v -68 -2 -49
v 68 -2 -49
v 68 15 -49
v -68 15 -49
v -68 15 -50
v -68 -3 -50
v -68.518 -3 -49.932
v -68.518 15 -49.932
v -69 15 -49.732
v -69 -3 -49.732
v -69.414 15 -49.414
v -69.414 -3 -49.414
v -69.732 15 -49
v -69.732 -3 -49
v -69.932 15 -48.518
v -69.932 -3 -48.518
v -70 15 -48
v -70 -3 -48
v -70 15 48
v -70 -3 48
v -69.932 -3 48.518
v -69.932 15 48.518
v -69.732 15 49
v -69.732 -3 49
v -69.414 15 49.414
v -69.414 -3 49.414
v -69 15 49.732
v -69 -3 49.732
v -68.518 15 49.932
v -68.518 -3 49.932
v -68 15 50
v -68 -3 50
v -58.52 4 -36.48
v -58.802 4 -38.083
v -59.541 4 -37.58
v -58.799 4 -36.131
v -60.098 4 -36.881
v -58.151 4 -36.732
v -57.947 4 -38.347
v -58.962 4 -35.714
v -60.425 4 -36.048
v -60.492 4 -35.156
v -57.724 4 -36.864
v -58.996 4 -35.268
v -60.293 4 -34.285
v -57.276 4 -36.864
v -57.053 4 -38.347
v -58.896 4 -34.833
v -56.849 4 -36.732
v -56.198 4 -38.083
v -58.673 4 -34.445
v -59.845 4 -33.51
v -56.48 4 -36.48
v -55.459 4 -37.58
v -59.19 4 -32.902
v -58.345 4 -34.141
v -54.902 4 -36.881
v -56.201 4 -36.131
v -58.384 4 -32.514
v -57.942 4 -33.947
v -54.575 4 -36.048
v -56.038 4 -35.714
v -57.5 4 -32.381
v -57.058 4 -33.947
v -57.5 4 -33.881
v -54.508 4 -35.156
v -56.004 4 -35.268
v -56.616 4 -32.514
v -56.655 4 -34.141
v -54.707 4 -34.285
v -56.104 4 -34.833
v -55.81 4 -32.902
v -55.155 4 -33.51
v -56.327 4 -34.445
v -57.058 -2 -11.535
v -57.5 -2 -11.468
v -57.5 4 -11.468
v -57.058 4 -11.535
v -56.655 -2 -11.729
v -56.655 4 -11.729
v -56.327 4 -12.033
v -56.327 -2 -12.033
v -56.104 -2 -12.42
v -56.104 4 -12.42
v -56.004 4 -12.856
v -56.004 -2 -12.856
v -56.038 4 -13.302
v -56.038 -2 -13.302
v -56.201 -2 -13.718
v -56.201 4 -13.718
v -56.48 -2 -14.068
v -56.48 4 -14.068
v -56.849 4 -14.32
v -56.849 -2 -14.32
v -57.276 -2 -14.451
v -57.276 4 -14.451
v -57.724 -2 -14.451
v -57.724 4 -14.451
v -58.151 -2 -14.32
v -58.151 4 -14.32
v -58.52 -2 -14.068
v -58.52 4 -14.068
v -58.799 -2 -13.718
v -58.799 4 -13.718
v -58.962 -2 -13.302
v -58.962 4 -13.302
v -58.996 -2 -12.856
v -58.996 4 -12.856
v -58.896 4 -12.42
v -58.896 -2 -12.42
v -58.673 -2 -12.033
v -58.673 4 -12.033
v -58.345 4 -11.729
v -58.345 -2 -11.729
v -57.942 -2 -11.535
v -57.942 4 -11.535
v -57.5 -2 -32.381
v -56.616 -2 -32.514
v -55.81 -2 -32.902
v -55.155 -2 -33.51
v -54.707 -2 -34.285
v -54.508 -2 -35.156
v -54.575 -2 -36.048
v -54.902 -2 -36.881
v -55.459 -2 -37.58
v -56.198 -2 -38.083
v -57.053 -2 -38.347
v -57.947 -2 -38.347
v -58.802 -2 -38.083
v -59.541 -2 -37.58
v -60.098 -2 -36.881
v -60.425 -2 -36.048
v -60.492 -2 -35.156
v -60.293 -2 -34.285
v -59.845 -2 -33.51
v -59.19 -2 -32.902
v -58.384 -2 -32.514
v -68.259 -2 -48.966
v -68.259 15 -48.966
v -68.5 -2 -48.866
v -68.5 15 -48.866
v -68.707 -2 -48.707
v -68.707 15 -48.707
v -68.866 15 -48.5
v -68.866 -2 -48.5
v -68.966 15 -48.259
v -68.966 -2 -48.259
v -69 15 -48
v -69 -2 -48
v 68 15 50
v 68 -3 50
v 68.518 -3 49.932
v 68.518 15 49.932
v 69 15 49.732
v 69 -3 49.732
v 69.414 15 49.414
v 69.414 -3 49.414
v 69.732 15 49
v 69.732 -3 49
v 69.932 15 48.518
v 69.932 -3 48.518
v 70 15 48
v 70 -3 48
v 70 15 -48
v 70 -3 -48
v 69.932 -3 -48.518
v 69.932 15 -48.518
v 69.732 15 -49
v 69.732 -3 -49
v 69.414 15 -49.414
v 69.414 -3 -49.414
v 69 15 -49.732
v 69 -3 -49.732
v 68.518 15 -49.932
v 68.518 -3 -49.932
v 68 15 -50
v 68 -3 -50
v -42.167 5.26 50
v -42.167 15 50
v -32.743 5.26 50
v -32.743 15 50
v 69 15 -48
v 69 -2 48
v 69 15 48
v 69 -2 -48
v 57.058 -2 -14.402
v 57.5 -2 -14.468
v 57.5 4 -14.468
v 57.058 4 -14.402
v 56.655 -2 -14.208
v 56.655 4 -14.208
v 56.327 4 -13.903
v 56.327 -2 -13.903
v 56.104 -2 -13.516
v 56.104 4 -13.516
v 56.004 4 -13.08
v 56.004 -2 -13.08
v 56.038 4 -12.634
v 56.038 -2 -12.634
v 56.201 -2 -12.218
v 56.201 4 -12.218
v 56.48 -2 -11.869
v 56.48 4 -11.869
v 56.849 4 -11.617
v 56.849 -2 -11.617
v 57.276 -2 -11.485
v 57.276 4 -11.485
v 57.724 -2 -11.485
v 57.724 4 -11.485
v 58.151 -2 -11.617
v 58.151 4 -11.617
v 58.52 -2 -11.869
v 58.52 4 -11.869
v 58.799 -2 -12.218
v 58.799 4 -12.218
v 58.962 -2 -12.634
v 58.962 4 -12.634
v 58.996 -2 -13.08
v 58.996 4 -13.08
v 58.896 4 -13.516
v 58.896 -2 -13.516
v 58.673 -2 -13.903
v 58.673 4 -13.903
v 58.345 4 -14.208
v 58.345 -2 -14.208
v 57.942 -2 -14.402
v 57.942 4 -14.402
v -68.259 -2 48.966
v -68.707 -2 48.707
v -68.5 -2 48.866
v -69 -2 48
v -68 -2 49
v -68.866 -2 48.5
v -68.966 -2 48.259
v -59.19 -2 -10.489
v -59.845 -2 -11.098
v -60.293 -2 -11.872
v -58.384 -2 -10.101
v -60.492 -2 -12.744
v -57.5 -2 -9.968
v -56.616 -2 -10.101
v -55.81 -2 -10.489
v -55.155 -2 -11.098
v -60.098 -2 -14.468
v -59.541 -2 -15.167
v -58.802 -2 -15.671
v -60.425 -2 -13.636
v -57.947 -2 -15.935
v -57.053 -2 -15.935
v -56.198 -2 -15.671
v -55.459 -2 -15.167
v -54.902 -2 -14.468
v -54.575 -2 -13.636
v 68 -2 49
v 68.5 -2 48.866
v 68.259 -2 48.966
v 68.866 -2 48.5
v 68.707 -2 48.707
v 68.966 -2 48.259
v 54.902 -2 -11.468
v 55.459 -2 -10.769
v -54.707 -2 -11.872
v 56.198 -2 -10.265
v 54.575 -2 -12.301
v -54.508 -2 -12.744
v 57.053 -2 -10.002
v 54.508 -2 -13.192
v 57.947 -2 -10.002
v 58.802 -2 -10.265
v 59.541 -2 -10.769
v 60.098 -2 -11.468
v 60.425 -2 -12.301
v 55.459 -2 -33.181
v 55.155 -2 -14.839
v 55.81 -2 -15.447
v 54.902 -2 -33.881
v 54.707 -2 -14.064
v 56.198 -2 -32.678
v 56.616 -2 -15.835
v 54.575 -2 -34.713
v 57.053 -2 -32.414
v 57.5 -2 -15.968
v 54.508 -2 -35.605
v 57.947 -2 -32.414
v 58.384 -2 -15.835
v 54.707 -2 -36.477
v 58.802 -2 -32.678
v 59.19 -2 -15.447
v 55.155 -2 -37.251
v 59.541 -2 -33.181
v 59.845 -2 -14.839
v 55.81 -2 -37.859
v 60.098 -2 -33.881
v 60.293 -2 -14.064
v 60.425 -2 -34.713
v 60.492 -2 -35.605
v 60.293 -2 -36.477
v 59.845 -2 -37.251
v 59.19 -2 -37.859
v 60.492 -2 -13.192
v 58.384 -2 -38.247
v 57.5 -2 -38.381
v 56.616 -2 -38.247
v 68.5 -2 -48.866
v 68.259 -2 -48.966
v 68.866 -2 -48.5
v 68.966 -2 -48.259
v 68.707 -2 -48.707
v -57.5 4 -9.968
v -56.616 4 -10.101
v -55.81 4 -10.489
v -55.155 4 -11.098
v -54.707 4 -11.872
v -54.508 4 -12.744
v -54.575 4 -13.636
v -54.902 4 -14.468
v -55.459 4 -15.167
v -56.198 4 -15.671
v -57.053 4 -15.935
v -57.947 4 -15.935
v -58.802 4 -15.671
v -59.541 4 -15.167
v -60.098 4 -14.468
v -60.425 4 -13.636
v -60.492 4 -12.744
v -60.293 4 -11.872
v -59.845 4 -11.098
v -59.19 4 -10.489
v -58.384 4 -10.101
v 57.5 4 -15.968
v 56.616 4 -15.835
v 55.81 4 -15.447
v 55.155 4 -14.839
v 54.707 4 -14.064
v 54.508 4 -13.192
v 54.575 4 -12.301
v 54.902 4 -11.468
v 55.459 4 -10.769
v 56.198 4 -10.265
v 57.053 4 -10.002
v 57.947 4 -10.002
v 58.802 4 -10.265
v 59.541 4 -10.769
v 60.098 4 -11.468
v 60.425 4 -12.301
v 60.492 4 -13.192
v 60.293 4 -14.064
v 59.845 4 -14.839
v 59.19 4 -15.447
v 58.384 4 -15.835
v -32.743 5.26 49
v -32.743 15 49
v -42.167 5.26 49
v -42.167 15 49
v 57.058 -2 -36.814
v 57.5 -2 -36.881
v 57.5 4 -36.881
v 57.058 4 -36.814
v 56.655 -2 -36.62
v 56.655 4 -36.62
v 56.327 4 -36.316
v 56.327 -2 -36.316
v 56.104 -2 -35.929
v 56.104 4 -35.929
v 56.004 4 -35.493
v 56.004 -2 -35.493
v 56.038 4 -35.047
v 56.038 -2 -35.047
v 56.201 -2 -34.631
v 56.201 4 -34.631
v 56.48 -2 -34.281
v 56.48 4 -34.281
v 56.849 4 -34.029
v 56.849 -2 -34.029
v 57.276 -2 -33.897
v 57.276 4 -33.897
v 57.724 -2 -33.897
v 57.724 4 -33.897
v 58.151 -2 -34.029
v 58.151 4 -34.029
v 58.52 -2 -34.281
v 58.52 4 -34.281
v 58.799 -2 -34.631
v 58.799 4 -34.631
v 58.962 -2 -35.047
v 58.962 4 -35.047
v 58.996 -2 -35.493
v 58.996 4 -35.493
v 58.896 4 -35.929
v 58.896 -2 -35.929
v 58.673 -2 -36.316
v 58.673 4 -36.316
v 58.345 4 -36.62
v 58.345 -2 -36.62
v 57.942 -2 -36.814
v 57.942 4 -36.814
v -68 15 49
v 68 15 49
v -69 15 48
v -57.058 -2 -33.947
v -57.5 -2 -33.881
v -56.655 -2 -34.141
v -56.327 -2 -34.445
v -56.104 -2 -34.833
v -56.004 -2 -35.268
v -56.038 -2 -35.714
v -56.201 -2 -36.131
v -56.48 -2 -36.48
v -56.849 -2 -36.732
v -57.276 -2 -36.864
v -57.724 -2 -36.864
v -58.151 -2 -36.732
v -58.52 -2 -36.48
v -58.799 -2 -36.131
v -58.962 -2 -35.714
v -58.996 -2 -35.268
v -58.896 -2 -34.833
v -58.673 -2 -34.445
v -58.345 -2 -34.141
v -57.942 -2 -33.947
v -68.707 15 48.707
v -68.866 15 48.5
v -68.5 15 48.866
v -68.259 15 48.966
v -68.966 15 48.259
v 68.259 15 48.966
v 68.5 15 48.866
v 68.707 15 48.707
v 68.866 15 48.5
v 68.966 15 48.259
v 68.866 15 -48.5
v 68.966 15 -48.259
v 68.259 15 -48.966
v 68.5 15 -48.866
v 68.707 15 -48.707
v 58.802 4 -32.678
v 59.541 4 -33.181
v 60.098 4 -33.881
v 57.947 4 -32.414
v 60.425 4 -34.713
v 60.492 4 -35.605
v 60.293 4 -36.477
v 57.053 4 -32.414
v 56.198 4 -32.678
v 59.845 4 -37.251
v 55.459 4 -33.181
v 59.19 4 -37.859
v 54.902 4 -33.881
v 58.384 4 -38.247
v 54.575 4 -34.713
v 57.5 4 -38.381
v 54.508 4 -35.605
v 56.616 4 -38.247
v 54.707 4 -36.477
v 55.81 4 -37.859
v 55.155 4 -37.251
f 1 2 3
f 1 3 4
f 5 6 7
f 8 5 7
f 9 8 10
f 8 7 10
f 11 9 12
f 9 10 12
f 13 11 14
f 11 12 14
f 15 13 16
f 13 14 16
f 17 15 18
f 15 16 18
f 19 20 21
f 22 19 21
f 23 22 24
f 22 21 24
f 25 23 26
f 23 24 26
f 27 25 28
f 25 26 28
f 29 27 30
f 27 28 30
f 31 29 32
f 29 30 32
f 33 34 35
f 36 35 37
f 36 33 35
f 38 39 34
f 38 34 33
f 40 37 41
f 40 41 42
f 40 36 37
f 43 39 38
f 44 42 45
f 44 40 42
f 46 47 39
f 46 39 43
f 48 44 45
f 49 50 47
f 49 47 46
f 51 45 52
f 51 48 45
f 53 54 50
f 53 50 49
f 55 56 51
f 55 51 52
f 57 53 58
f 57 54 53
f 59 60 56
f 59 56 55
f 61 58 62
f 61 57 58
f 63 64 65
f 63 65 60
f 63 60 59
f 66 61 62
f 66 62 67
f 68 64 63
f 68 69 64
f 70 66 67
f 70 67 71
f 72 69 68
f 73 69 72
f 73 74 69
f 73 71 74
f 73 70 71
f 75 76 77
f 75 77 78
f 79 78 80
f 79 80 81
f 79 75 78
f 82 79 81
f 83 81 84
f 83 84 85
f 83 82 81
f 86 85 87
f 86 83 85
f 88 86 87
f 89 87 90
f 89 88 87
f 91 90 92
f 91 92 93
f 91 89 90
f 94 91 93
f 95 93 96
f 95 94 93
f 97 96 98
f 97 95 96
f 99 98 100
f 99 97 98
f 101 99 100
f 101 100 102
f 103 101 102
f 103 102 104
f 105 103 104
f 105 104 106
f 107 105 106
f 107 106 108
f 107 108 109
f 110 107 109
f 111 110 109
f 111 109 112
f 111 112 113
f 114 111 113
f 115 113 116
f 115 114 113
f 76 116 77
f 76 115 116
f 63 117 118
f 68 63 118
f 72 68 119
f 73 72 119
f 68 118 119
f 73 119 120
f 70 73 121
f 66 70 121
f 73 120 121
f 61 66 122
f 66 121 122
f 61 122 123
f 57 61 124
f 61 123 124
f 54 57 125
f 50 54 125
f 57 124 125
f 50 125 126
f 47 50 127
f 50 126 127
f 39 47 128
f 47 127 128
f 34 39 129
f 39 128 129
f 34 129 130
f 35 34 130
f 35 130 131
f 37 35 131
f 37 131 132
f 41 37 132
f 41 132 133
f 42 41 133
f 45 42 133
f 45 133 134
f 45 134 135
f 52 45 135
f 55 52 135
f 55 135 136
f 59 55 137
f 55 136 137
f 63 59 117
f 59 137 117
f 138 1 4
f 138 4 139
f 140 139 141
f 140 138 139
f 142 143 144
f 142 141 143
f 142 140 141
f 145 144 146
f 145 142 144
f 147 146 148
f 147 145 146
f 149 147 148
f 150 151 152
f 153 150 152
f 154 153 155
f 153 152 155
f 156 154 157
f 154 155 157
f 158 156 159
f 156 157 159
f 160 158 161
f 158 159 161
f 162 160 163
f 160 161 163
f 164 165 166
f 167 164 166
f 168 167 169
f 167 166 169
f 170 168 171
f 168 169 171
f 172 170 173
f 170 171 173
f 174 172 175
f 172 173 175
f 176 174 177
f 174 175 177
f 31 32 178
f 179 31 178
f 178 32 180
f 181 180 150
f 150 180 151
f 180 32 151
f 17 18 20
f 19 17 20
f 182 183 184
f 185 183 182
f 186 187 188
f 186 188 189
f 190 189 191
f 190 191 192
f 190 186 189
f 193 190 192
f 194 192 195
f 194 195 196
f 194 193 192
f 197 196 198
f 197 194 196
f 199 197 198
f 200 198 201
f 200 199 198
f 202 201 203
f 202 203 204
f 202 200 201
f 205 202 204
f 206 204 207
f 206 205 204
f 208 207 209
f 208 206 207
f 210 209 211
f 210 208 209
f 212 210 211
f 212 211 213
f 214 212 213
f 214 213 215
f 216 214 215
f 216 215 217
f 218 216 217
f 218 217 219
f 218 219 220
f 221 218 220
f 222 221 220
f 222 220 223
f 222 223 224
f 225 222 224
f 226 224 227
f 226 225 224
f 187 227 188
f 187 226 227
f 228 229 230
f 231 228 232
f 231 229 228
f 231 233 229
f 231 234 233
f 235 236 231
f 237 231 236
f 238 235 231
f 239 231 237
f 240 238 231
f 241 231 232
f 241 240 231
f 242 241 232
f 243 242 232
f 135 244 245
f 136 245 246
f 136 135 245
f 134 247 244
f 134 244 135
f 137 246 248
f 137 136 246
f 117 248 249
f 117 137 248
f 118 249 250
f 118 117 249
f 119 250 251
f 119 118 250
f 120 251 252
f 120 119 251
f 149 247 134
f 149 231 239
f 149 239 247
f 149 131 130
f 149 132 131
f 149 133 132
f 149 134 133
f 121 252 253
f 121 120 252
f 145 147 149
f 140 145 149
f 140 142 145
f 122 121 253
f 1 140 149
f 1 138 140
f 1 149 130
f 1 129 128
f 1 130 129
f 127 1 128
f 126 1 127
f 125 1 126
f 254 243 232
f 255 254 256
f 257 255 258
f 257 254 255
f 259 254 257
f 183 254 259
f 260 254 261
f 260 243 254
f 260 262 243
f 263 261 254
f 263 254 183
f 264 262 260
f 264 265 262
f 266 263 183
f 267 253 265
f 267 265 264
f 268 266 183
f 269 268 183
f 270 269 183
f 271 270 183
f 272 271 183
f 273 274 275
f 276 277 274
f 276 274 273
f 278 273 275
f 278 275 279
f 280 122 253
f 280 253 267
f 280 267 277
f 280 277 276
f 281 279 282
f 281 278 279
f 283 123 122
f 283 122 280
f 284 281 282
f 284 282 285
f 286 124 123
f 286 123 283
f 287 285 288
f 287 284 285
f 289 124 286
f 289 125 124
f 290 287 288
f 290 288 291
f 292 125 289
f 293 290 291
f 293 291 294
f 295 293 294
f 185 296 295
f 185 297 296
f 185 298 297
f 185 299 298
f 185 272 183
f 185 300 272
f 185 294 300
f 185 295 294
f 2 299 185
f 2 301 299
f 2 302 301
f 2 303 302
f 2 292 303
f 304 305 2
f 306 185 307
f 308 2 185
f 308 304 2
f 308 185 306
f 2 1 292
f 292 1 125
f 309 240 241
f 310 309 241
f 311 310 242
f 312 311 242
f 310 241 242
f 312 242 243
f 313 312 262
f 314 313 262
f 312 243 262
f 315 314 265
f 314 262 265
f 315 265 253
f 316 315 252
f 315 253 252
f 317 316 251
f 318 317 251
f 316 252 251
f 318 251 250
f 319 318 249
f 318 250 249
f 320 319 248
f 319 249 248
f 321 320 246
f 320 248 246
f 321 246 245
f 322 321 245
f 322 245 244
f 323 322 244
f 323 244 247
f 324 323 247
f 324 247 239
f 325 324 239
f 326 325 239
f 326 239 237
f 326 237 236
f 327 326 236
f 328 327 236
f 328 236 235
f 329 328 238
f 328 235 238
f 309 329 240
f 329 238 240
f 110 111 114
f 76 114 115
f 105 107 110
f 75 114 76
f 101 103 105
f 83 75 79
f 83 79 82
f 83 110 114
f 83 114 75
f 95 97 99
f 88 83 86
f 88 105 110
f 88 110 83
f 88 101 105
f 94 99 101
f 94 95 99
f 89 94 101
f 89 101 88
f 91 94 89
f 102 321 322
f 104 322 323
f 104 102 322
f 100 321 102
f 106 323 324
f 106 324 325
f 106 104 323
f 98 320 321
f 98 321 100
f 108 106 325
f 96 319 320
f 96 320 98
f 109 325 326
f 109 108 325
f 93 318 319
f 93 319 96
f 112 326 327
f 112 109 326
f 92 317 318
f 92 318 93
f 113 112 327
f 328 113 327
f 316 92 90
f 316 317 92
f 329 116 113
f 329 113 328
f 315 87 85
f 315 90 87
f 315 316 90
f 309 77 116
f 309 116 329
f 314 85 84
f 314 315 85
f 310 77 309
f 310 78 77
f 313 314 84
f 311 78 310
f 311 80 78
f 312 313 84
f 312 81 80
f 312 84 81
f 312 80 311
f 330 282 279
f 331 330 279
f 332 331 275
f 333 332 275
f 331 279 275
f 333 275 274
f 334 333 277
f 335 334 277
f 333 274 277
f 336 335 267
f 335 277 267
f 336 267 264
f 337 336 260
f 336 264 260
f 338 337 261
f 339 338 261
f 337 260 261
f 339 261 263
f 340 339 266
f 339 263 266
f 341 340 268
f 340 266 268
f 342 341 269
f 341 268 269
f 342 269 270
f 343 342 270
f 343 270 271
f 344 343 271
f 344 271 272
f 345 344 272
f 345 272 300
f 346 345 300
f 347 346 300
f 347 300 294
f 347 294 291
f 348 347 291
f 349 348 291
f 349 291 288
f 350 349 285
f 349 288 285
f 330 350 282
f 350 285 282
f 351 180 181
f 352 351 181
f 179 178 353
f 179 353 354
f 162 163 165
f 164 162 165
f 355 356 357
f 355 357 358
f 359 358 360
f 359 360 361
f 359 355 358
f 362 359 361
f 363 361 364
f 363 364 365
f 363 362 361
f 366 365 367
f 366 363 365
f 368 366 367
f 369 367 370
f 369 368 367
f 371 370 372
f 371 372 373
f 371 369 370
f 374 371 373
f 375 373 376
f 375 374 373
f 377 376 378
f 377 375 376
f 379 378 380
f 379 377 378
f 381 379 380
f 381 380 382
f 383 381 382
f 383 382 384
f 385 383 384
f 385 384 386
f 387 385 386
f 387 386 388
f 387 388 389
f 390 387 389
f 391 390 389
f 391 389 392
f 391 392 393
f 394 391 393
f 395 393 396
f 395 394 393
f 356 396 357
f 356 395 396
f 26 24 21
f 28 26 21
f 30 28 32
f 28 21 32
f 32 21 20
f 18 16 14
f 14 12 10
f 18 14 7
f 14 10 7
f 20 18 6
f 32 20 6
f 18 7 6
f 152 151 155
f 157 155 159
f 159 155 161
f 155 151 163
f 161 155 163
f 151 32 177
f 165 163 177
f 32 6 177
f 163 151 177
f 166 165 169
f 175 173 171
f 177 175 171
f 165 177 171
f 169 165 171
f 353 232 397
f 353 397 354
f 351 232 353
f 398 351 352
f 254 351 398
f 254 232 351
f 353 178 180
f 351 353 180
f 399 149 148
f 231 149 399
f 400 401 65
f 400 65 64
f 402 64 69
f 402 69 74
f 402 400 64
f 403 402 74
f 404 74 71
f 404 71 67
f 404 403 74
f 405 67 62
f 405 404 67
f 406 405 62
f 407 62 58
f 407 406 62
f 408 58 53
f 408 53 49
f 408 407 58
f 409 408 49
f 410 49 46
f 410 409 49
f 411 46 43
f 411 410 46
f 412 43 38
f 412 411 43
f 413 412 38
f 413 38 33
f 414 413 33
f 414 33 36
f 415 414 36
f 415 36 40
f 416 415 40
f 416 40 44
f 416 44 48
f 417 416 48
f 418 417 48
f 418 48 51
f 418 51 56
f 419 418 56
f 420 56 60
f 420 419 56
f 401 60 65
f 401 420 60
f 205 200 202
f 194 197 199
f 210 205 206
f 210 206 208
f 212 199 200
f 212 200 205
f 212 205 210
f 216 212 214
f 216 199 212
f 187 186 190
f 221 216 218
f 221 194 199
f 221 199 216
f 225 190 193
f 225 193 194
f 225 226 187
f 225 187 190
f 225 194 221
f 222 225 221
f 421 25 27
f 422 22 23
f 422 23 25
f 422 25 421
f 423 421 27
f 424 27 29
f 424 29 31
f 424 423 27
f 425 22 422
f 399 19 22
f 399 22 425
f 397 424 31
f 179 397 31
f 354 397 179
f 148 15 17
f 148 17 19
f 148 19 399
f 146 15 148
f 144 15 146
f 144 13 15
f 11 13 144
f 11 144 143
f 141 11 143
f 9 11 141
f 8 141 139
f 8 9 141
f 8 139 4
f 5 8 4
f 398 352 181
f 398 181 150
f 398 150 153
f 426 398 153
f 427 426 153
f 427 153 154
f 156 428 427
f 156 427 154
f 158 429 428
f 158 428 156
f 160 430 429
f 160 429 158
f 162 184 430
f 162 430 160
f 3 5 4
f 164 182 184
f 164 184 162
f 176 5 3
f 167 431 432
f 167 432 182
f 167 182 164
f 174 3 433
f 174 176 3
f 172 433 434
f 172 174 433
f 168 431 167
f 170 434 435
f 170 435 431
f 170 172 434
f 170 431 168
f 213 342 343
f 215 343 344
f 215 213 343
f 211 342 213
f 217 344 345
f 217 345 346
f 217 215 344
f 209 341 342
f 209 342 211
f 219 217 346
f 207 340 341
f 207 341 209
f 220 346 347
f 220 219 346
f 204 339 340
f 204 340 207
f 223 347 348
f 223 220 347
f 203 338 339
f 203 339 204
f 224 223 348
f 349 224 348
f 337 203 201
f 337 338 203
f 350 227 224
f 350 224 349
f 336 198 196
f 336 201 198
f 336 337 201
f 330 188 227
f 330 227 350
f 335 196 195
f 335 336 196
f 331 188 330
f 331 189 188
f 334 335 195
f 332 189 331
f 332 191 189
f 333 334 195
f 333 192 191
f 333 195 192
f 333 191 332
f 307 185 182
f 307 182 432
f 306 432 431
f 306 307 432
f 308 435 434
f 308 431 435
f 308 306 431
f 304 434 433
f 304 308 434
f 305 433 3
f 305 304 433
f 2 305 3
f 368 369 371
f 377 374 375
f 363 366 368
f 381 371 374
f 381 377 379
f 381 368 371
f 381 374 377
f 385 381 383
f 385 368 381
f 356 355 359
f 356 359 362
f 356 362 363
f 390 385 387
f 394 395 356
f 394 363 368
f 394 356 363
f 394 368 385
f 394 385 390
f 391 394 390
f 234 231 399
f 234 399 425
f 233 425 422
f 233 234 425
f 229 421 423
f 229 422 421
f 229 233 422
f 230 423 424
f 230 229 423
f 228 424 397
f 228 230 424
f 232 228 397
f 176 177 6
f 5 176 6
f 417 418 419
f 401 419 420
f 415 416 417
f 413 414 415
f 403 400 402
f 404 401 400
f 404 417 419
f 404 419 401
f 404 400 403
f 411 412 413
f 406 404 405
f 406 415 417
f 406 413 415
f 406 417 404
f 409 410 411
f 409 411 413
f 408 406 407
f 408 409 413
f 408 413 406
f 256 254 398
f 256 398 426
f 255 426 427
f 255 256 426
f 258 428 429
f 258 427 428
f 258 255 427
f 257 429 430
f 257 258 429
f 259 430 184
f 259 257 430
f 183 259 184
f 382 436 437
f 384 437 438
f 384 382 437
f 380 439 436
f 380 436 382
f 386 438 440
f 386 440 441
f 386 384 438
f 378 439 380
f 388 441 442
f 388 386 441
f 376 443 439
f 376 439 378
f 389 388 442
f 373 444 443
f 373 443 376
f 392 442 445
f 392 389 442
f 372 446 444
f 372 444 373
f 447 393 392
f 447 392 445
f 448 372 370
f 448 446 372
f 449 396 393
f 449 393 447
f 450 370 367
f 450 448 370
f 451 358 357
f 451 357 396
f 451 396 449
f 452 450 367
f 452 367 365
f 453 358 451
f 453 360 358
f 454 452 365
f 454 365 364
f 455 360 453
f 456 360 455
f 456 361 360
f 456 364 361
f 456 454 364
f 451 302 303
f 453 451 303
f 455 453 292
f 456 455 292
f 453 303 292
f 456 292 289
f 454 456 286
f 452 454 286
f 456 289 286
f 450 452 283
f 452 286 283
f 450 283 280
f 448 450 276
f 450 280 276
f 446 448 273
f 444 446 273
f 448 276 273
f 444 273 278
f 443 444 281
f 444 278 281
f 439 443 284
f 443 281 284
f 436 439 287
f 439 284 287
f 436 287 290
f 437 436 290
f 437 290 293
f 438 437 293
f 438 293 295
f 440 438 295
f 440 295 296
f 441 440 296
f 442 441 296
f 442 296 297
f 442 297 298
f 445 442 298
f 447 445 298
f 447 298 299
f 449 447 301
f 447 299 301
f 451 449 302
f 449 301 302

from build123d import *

# Parameters (mm, degrees)
BOSS_EXTRUDE1_DEPTH      = 15
BOSS_EXTRUDE1_DEPTH_BACK = 3
SHELL1_T                 = -1
SKETCH2_R                = 3
SKETCH2_R_2              = 1.5
BOSS_EXTRUDE2_DEPTH      = 6
SKETCH4_W                = 9.424257845
SKETCH4_H                = 10.522525497
CUT_EXTRUDE1_DEPTH       = 10


with BuildPart() as part:
    # Sketch1 → Boss-Extrude1 (new, two sides: drawn at the far end of the back side and taken through both)
    with BuildSketch(Plane(origin=(0, 0, 0), x_dir=(1, 0, 0), z_dir=(0, 1, 0)).offset(-BOSS_EXTRUDE1_DEPTH_BACK)):
        with BuildLine():
            Line((-68, -50), (68, -50))
            ThreePointArc((68, -50), (69.414213562, -49.414213562), (70, -48))
            Line((70, -48), (70, 48))
            ThreePointArc((70, 48), (69.414213562, 49.414213562), (68, 50))
            Line((68, 50), (-68, 50))
            ThreePointArc((-68, 50), (-69.414213562, 49.414213562), (-70, 48))
            Line((-70, 48), (-70, -48))
            ThreePointArc((-70, -48), (-69.414213562, -49.414213562), (-68, -50))
        make_face()
    extrude(amount=BOSS_EXTRUDE1_DEPTH + BOSS_EXTRUDE1_DEPTH_BACK)

    # Shell1
    shell1_openings = [part.faces().sort_by_distance(p)[0] for p in [
        (0, 15, 0),
    ]]
    offset(amount=SHELL1_T, openings=shell1_openings, kind=Kind.INTERSECTION)

    # Sketch2 → Boss-Extrude2 (add)
    # profile 1 of 4: a face of its own
    with BuildSketch(Plane(origin=(0, -2, 0), x_dir=(1, 0, 0), z_dir=(0, 1, 0))):
        with Locations(Location((-57.5, 35.380535612, 0), (0, 0, 270))):
            Circle(SKETCH2_R)
        with Locations(Location((-57.5, 35.380535612, 0), (0, 0, 270))):
            Circle(SKETCH2_R_2, mode=Mode.SUBTRACT)
    # profile 2 of 4: a face of its own
    with BuildSketch(Plane(origin=(0, -2, 0), x_dir=(1, 0, 0), z_dir=(0, 1, 0))):
        with Locations(Location((-57.5, 12.968164447, 0), (0, 0, 270))):
            Circle(SKETCH2_R)
        with Locations(Location((-57.5, 12.968164447, 0), (0, 0, 270))):
            Circle(SKETCH2_R_2, mode=Mode.SUBTRACT)
    # profile 3 of 4: a face of its own
    with BuildSketch(Plane(origin=(0, -2, 0), x_dir=(1, 0, 0), z_dir=(0, 1, 0))):
        with Locations(Location((57.5, 12.968164447, 0), (0, 0, 90))):
            Circle(SKETCH2_R)
        with Locations(Location((57.5, 12.968164447, 0), (0, 0, 90))):
            Circle(SKETCH2_R_2, mode=Mode.SUBTRACT)
    # profile 4 of 4: a face of its own
    with BuildSketch(Plane(origin=(0, -2, 0), x_dir=(1, 0, 0), z_dir=(0, 1, 0))):
        with Locations(Location((57.5, 35.380535612, 0), (0, 0, 90))):
            Circle(SKETCH2_R)
        with Locations(Location((57.5, 35.380535612, 0), (0, 0, 90))):
            Circle(SKETCH2_R_2, mode=Mode.SUBTRACT)
    extrude(amount=BOSS_EXTRUDE2_DEPTH)

    # Sketch4 → Cut-Extrude1 (cut)
    with BuildSketch(Plane.XY.offset(50)):
        with Locations((-37.455086441, 10.521410827)):
            Rectangle(SKETCH4_W, SKETCH4_H)
    extrude(amount=-CUT_EXTRUDE1_DEPTH, mode=Mode.SUBTRACT)


solid = part.part
